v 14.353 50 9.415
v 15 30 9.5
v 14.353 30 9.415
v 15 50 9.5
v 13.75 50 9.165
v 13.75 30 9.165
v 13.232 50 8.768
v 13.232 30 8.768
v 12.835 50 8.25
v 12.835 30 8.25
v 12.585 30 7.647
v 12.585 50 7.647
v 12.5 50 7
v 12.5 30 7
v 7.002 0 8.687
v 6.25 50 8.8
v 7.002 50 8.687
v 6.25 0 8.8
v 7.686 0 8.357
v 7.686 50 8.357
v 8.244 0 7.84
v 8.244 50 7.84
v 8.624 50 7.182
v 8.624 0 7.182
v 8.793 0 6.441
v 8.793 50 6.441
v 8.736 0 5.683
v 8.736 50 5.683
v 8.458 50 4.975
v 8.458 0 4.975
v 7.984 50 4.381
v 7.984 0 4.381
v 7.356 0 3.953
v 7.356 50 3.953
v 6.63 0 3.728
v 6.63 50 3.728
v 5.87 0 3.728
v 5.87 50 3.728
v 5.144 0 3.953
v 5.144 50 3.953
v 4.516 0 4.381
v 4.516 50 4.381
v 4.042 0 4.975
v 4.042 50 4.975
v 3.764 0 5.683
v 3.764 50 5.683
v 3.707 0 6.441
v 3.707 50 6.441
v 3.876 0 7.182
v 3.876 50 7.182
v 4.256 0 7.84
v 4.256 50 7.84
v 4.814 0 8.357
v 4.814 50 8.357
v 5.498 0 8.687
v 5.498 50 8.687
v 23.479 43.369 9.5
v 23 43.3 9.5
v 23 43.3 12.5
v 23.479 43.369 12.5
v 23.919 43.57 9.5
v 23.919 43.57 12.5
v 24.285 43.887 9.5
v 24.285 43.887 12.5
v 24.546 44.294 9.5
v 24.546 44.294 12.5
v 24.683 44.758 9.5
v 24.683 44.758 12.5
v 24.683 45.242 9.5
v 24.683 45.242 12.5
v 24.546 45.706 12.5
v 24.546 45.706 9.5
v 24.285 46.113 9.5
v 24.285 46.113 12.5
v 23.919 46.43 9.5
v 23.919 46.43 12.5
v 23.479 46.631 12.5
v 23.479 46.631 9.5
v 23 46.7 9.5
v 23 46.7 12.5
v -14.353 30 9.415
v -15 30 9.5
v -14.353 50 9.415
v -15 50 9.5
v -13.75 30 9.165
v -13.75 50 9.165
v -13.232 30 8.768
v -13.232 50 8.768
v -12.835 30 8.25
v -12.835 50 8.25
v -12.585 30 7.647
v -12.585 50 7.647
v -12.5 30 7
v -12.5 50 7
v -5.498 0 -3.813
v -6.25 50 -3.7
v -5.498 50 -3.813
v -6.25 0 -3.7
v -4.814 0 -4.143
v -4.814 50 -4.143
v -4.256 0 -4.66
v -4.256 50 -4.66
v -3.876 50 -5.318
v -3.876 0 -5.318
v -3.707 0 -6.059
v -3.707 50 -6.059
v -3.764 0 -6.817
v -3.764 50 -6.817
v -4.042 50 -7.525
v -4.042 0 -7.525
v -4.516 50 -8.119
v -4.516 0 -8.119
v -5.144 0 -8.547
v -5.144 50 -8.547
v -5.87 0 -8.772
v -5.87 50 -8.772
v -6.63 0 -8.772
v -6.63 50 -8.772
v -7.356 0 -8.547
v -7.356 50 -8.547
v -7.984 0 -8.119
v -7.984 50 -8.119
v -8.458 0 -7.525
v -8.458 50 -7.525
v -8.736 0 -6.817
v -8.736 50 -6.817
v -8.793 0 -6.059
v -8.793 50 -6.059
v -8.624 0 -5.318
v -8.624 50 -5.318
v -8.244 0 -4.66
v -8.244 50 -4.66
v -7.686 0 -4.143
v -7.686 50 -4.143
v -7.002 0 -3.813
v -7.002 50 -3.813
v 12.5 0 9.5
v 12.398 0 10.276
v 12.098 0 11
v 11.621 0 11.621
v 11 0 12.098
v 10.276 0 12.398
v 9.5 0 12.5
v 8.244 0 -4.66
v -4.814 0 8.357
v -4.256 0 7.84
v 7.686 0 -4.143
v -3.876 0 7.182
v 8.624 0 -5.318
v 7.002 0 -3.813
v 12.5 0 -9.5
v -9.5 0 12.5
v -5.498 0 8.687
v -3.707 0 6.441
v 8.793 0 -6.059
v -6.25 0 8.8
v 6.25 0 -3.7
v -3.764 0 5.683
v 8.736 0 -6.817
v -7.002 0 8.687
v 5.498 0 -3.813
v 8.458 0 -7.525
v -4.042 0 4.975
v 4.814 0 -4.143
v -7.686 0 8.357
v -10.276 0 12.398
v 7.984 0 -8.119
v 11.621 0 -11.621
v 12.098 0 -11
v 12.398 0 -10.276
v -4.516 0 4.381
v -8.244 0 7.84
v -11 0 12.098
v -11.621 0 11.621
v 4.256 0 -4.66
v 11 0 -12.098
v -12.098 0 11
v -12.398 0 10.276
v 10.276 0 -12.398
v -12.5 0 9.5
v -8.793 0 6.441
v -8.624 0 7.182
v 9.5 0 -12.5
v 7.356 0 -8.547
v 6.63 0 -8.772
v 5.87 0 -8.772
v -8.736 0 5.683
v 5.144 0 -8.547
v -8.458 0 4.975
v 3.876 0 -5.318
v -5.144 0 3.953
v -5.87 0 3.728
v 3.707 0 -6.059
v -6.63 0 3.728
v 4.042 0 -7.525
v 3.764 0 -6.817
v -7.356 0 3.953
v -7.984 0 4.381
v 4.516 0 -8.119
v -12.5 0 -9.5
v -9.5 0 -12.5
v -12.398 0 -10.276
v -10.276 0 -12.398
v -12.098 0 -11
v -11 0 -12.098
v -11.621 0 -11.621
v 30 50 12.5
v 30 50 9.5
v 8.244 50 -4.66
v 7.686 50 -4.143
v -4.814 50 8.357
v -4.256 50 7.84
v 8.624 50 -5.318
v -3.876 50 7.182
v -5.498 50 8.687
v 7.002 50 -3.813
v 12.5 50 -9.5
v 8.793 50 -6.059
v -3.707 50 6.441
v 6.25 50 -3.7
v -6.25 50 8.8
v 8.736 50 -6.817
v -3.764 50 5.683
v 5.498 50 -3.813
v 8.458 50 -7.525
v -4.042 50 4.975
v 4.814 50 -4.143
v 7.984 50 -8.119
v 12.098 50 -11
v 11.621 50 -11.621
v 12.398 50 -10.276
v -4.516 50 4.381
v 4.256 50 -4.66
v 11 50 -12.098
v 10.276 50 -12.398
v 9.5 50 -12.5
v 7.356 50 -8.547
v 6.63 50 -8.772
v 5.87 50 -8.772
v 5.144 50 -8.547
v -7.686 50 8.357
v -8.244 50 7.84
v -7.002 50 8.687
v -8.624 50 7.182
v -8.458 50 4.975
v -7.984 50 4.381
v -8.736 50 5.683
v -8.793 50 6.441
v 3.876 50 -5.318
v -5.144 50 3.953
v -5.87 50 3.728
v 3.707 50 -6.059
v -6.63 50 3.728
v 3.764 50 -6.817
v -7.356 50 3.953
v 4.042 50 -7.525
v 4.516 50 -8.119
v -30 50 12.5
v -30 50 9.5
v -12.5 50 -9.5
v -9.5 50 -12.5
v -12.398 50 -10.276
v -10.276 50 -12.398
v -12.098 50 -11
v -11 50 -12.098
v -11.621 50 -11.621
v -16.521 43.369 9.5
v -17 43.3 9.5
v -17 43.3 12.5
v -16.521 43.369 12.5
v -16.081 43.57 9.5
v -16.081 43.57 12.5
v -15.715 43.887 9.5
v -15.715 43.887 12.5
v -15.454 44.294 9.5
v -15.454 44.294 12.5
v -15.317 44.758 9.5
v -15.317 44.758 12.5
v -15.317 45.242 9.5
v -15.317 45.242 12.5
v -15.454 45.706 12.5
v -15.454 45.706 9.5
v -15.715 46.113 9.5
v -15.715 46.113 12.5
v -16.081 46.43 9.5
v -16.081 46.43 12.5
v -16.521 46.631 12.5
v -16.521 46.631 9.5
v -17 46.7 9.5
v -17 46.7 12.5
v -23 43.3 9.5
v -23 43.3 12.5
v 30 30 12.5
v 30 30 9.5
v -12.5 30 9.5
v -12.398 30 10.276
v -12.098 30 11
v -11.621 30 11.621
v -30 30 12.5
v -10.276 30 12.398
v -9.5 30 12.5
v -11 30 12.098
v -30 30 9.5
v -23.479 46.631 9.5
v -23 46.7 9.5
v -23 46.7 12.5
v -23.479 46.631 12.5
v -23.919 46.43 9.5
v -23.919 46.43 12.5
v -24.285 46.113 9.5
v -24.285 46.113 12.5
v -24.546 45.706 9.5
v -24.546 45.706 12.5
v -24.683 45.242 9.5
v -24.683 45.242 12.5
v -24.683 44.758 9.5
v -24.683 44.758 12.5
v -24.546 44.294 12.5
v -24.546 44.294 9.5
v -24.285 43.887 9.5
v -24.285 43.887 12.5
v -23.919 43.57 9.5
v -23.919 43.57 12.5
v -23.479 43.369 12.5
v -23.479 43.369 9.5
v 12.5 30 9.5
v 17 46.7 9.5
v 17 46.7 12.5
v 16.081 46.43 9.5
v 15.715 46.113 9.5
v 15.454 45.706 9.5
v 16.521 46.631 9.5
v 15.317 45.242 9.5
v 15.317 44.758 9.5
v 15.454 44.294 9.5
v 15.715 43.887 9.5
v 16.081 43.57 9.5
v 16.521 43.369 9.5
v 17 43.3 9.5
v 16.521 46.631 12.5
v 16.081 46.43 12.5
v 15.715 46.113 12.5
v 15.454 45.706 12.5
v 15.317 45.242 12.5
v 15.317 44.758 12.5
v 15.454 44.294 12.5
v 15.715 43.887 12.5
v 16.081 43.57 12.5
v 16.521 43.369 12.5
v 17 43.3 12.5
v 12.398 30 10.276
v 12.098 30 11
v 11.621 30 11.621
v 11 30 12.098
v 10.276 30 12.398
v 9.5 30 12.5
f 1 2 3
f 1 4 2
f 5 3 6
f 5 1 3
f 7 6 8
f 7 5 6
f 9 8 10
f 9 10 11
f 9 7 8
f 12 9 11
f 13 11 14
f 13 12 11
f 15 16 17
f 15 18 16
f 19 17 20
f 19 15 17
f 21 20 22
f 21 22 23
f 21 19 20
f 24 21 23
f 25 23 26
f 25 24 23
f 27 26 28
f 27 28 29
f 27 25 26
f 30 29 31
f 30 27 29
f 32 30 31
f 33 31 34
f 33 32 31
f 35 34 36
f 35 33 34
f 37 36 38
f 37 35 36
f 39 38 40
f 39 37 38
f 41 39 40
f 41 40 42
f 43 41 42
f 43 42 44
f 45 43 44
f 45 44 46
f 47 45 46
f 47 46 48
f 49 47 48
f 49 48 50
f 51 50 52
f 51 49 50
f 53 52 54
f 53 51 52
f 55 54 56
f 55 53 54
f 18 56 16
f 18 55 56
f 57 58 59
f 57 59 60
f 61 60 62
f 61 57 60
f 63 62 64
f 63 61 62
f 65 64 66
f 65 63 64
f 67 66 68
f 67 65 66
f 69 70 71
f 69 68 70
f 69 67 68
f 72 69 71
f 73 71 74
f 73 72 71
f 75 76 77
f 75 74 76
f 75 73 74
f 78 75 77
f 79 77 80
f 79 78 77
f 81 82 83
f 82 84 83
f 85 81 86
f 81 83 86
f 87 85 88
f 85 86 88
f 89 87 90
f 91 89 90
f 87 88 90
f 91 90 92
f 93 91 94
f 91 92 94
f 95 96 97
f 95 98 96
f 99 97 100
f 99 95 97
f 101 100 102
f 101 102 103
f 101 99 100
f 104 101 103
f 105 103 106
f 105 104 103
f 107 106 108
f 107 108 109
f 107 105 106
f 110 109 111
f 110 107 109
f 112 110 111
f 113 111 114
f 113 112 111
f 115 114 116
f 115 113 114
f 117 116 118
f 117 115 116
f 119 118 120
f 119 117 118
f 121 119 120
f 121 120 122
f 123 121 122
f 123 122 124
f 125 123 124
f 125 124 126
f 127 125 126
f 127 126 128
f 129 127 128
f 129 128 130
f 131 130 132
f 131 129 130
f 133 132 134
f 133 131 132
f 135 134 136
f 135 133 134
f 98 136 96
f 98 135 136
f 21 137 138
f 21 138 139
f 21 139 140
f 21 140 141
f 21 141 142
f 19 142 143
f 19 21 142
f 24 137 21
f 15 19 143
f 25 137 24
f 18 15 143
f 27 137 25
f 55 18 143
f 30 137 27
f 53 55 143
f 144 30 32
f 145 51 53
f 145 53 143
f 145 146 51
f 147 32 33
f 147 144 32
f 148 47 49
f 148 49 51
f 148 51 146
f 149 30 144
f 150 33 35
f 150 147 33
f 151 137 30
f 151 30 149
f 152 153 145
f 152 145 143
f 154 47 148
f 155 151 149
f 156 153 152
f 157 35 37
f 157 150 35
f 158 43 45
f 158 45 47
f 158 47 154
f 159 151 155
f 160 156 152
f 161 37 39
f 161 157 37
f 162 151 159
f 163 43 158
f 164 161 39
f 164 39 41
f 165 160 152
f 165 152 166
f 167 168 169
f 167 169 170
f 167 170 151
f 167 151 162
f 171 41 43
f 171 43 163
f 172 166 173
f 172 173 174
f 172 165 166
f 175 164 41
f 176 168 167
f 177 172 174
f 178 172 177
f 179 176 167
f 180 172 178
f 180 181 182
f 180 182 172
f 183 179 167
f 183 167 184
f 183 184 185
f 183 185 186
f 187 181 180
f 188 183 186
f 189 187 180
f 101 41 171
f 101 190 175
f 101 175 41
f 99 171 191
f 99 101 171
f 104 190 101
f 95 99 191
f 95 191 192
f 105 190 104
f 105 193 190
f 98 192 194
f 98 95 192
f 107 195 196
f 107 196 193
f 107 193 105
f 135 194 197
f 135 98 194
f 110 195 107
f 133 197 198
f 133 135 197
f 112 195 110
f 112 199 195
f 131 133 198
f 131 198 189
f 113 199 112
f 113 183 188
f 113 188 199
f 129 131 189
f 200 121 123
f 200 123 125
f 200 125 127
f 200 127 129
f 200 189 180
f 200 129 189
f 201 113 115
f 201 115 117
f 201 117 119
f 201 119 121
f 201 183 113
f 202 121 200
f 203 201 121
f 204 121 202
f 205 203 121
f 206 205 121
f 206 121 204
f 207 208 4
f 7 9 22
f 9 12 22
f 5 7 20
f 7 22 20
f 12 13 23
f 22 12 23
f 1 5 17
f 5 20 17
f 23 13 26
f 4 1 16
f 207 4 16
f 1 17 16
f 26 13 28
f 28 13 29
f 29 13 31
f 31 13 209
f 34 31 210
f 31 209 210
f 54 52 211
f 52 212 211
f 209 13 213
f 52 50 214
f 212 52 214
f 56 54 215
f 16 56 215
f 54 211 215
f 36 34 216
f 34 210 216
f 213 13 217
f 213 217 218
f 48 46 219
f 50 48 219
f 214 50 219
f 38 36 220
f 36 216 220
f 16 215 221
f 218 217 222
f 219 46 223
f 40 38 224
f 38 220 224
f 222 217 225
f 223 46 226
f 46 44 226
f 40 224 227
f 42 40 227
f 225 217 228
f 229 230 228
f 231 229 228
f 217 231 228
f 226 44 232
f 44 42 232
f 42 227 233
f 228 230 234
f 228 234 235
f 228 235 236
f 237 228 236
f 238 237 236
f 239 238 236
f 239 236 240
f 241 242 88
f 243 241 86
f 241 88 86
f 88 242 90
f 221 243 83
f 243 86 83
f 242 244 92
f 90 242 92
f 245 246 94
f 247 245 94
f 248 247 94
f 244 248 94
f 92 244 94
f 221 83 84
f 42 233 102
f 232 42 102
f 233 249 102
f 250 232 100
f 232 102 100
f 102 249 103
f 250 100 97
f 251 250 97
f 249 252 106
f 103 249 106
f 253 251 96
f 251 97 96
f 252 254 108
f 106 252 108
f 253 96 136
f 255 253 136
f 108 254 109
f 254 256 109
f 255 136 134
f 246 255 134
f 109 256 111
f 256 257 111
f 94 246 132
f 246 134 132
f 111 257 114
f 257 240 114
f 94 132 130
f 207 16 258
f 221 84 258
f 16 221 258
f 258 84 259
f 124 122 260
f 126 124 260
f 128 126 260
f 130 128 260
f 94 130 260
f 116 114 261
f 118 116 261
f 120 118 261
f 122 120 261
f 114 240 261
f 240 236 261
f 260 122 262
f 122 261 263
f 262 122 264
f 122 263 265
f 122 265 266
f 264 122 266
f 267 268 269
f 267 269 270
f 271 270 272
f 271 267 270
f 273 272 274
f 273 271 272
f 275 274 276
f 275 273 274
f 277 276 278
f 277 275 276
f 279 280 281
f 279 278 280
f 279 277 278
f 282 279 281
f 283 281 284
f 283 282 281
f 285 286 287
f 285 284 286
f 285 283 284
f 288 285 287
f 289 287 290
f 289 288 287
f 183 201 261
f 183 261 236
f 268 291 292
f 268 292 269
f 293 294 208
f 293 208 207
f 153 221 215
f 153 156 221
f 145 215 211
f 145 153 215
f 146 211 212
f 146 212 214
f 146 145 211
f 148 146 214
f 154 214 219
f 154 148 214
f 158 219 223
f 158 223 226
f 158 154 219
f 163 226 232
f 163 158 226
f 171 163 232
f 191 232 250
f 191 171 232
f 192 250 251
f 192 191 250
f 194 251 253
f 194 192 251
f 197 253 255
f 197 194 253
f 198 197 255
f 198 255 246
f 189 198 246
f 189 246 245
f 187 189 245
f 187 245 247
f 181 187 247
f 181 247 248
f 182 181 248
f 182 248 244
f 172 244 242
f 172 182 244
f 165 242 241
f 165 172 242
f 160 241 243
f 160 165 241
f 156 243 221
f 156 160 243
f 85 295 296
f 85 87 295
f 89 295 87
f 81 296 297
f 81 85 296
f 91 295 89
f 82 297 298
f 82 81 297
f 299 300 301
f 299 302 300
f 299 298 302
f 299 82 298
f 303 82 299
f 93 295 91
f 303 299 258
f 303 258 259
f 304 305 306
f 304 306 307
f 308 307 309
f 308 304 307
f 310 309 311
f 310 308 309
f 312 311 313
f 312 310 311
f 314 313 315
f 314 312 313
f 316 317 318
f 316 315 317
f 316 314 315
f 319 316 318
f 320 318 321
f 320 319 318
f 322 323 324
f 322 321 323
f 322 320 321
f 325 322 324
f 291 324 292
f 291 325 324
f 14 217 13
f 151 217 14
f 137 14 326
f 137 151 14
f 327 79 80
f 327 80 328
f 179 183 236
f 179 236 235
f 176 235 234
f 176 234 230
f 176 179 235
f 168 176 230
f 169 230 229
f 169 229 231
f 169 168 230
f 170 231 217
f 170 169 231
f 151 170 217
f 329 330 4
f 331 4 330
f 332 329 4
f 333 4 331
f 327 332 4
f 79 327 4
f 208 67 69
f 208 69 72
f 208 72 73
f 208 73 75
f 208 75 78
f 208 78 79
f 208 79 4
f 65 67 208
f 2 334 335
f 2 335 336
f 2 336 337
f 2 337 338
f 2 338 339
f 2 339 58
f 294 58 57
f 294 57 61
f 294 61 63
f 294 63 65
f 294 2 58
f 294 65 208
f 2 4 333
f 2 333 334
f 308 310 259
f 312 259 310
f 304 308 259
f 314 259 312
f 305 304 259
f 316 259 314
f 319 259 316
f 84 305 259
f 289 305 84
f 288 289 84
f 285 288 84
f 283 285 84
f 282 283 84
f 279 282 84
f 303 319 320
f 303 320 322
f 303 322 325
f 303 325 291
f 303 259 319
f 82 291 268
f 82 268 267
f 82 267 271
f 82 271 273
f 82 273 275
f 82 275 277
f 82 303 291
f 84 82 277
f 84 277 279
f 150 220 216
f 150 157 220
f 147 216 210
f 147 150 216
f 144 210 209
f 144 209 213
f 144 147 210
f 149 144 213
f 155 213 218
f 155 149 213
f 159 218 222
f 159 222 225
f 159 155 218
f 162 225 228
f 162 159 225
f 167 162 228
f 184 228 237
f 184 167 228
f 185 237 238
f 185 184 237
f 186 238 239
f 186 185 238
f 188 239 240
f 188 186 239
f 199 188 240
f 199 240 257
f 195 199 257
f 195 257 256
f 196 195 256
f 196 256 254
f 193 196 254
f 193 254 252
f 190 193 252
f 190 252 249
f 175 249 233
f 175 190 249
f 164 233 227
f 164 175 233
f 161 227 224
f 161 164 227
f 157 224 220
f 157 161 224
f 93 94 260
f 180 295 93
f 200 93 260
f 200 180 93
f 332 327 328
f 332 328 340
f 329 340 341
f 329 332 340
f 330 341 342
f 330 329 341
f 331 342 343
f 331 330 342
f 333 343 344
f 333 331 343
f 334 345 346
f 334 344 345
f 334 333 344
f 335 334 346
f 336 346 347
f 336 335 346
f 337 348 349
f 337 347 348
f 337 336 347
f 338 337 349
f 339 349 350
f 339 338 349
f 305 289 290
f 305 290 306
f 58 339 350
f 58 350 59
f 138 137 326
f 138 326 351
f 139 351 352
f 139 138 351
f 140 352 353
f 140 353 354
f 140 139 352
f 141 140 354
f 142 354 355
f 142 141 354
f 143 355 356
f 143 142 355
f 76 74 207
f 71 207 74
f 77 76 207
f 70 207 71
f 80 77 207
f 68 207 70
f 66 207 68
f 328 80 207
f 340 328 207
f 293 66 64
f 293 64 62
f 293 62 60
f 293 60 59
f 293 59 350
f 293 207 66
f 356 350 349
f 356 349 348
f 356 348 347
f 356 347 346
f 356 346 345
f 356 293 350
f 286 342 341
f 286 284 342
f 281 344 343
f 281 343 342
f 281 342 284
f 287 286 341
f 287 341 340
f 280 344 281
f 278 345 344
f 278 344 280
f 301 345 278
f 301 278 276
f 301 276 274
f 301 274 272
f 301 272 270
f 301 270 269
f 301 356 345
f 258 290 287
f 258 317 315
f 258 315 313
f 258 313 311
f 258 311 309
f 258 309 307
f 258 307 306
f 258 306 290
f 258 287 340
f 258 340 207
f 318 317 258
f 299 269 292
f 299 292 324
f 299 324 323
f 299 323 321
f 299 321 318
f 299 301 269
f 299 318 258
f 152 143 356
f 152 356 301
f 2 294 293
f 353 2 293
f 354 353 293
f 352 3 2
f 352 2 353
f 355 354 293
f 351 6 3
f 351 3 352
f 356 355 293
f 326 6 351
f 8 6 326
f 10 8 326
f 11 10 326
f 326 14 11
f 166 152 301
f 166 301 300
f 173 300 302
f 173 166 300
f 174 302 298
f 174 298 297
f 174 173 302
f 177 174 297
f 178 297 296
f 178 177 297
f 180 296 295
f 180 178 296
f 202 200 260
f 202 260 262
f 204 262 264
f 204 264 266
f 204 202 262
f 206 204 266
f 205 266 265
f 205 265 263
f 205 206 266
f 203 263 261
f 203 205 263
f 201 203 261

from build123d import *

# Parameters (mm, degrees)
SKETCH_1_R          = 2.55
EXTRUDE_1_DEPTH     = 30
SKETCH_2_R          = 2.55
EXTRUDE_2_DEPTH     = 20
CUT_EXTRUDE_1_DEPTH = 20
FILLET_1_R          = 2.5


with BuildPart() as part:
    # 草图1 → 凸台-拉伸1 (new body)
    with BuildSketch(Plane(origin=(0, 0, 0), x_dir=(1, 0, 0), z_dir=(0, 1, 0))):
        with BuildLine():
            Line((-9.5, 12.5), (9.5, 12.5))
            ThreePointArc((9.5, 12.5), (11.621320344, 11.621320344), (12.5, 9.5))
            Line((12.5, 9.5), (12.5, -9.5))
            ThreePointArc((12.5, -9.5), (11.621320344, -11.621320344), (9.5, -12.5))
            Line((9.5, -12.5), (-9.5, -12.5))
            ThreePointArc((-9.5, -12.5), (-11.621320344, -11.621320344), (-12.5, -9.5))
            Line((-12.5, -9.5), (-12.5, 9.5))
            ThreePointArc((-12.5, 9.5), (-11.621320344, 11.621320344), (-9.5, 12.5))
        make_face()
        with Locations(Location((6.25, 6.25, 0), (0, 0, 270))):
            Circle(SKETCH_1_R, mode=Mode.SUBTRACT)
        with Locations(Location((-6.25, 6.25, 0), (0, 0, 270))):
            Circle(SKETCH_1_R, mode=Mode.SUBTRACT)
        with Locations(Location((-6.25, -6.25, 0), (0, 0, 270))):
            Circle(SKETCH_1_R, mode=Mode.SUBTRACT)
        with Locations(Location((6.25, -6.25, 0), (0, 0, 270))):
            Circle(SKETCH_1_R, mode=Mode.SUBTRACT)
    extrude(amount=EXTRUDE_1_DEPTH)

    # 草图2 → 凸台-拉伸2 (add)
    with BuildSketch(Plane(origin=(0, 30, 0), x_dir=(1, 0, 0), z_dir=(0, 1, 0))):
        with BuildLine():
            Line((-9.5, -12.5), (-30, -12.5))
            Line((-30, -12.5), (-30, -9.5))
            Line((-30, -9.5), (-12.5, -9.5))
            Line((-12.5, -9.5), (-12.5, 9.5))
            ThreePointArc((-12.5, 9.5), (-11.621320344, 11.621320344), (-9.5, 12.5))
            Line((-9.5, 12.5), (9.5, 12.5))
            ThreePointArc((9.5, 12.5), (11.621320344, 11.621320344), (12.5, 9.5))
            Line((12.5, 9.5), (12.5, -9.5))
            Line((12.5, -9.5), (30, -9.5))
            Line((30, -9.5), (30, -12.5))
            Line((30, -12.5), (9.5, -12.5))
            Line((9.5, -12.5), (-9.5, -12.5))
        make_face()
        with Locations(Location((-6.25, 6.25, 0), (0, 0, 270))):
            Circle(SKETCH_2_R, mode=Mode.SUBTRACT)
        with Locations(Location((6.25, 6.25, 0), (0, 0, 270))):
            Circle(SKETCH_2_R, mode=Mode.SUBTRACT)
        with Locations(Location((-6.25, -6.25, 0), (0, 0, 270))):
            Circle(SKETCH_2_R, mode=Mode.SUBTRACT)
        with Locations(Location((6.25, -6.25, 0), (0, 0, 270))):
            Circle(SKETCH_2_R, mode=Mode.SUBTRACT)
    extrude(amount=EXTRUDE_2_DEPTH)

    # 草图3 → 切除-拉伸1 (cut)
    with BuildSketch(Plane(origin=(0, 0, 9.5), x_dir=(-1, 0, 0), z_dir=(0, 0, -1))):
        with BuildLine():
            Line((-23, 46.7), (-17, 46.7))
            ThreePointArc((-17, 46.7), (-15.3, 45), (-17, 43.3))
            Line((-17, 43.3), (-23, 43.3))
            ThreePointArc((-23, 43.3), (-24.7, 45), (-23, 46.7))
        make_face()
        with BuildLine():
            Line((23, 43.3), (17, 43.3))
            ThreePointArc((17, 43.3), (15.3, 45), (17, 46.7))
            Line((17, 46.7), (23, 46.7))
            ThreePointArc((23, 46.7), (24.7, 45), (23, 43.3))
        make_face()
    extrude(amount=-CUT_EXTRUDE_1_DEPTH, mode=Mode.SUBTRACT)

    # 圆角1
    fillet_1_edges = [part.edges().sort_by_distance(p)[0] for p in [
        (12.5, 40, 9.5),
        (-12.5, 40, 9.5),
    ]]
    fillet(fillet_1_edges, radius=FILLET_1_R)


solid = part.part
